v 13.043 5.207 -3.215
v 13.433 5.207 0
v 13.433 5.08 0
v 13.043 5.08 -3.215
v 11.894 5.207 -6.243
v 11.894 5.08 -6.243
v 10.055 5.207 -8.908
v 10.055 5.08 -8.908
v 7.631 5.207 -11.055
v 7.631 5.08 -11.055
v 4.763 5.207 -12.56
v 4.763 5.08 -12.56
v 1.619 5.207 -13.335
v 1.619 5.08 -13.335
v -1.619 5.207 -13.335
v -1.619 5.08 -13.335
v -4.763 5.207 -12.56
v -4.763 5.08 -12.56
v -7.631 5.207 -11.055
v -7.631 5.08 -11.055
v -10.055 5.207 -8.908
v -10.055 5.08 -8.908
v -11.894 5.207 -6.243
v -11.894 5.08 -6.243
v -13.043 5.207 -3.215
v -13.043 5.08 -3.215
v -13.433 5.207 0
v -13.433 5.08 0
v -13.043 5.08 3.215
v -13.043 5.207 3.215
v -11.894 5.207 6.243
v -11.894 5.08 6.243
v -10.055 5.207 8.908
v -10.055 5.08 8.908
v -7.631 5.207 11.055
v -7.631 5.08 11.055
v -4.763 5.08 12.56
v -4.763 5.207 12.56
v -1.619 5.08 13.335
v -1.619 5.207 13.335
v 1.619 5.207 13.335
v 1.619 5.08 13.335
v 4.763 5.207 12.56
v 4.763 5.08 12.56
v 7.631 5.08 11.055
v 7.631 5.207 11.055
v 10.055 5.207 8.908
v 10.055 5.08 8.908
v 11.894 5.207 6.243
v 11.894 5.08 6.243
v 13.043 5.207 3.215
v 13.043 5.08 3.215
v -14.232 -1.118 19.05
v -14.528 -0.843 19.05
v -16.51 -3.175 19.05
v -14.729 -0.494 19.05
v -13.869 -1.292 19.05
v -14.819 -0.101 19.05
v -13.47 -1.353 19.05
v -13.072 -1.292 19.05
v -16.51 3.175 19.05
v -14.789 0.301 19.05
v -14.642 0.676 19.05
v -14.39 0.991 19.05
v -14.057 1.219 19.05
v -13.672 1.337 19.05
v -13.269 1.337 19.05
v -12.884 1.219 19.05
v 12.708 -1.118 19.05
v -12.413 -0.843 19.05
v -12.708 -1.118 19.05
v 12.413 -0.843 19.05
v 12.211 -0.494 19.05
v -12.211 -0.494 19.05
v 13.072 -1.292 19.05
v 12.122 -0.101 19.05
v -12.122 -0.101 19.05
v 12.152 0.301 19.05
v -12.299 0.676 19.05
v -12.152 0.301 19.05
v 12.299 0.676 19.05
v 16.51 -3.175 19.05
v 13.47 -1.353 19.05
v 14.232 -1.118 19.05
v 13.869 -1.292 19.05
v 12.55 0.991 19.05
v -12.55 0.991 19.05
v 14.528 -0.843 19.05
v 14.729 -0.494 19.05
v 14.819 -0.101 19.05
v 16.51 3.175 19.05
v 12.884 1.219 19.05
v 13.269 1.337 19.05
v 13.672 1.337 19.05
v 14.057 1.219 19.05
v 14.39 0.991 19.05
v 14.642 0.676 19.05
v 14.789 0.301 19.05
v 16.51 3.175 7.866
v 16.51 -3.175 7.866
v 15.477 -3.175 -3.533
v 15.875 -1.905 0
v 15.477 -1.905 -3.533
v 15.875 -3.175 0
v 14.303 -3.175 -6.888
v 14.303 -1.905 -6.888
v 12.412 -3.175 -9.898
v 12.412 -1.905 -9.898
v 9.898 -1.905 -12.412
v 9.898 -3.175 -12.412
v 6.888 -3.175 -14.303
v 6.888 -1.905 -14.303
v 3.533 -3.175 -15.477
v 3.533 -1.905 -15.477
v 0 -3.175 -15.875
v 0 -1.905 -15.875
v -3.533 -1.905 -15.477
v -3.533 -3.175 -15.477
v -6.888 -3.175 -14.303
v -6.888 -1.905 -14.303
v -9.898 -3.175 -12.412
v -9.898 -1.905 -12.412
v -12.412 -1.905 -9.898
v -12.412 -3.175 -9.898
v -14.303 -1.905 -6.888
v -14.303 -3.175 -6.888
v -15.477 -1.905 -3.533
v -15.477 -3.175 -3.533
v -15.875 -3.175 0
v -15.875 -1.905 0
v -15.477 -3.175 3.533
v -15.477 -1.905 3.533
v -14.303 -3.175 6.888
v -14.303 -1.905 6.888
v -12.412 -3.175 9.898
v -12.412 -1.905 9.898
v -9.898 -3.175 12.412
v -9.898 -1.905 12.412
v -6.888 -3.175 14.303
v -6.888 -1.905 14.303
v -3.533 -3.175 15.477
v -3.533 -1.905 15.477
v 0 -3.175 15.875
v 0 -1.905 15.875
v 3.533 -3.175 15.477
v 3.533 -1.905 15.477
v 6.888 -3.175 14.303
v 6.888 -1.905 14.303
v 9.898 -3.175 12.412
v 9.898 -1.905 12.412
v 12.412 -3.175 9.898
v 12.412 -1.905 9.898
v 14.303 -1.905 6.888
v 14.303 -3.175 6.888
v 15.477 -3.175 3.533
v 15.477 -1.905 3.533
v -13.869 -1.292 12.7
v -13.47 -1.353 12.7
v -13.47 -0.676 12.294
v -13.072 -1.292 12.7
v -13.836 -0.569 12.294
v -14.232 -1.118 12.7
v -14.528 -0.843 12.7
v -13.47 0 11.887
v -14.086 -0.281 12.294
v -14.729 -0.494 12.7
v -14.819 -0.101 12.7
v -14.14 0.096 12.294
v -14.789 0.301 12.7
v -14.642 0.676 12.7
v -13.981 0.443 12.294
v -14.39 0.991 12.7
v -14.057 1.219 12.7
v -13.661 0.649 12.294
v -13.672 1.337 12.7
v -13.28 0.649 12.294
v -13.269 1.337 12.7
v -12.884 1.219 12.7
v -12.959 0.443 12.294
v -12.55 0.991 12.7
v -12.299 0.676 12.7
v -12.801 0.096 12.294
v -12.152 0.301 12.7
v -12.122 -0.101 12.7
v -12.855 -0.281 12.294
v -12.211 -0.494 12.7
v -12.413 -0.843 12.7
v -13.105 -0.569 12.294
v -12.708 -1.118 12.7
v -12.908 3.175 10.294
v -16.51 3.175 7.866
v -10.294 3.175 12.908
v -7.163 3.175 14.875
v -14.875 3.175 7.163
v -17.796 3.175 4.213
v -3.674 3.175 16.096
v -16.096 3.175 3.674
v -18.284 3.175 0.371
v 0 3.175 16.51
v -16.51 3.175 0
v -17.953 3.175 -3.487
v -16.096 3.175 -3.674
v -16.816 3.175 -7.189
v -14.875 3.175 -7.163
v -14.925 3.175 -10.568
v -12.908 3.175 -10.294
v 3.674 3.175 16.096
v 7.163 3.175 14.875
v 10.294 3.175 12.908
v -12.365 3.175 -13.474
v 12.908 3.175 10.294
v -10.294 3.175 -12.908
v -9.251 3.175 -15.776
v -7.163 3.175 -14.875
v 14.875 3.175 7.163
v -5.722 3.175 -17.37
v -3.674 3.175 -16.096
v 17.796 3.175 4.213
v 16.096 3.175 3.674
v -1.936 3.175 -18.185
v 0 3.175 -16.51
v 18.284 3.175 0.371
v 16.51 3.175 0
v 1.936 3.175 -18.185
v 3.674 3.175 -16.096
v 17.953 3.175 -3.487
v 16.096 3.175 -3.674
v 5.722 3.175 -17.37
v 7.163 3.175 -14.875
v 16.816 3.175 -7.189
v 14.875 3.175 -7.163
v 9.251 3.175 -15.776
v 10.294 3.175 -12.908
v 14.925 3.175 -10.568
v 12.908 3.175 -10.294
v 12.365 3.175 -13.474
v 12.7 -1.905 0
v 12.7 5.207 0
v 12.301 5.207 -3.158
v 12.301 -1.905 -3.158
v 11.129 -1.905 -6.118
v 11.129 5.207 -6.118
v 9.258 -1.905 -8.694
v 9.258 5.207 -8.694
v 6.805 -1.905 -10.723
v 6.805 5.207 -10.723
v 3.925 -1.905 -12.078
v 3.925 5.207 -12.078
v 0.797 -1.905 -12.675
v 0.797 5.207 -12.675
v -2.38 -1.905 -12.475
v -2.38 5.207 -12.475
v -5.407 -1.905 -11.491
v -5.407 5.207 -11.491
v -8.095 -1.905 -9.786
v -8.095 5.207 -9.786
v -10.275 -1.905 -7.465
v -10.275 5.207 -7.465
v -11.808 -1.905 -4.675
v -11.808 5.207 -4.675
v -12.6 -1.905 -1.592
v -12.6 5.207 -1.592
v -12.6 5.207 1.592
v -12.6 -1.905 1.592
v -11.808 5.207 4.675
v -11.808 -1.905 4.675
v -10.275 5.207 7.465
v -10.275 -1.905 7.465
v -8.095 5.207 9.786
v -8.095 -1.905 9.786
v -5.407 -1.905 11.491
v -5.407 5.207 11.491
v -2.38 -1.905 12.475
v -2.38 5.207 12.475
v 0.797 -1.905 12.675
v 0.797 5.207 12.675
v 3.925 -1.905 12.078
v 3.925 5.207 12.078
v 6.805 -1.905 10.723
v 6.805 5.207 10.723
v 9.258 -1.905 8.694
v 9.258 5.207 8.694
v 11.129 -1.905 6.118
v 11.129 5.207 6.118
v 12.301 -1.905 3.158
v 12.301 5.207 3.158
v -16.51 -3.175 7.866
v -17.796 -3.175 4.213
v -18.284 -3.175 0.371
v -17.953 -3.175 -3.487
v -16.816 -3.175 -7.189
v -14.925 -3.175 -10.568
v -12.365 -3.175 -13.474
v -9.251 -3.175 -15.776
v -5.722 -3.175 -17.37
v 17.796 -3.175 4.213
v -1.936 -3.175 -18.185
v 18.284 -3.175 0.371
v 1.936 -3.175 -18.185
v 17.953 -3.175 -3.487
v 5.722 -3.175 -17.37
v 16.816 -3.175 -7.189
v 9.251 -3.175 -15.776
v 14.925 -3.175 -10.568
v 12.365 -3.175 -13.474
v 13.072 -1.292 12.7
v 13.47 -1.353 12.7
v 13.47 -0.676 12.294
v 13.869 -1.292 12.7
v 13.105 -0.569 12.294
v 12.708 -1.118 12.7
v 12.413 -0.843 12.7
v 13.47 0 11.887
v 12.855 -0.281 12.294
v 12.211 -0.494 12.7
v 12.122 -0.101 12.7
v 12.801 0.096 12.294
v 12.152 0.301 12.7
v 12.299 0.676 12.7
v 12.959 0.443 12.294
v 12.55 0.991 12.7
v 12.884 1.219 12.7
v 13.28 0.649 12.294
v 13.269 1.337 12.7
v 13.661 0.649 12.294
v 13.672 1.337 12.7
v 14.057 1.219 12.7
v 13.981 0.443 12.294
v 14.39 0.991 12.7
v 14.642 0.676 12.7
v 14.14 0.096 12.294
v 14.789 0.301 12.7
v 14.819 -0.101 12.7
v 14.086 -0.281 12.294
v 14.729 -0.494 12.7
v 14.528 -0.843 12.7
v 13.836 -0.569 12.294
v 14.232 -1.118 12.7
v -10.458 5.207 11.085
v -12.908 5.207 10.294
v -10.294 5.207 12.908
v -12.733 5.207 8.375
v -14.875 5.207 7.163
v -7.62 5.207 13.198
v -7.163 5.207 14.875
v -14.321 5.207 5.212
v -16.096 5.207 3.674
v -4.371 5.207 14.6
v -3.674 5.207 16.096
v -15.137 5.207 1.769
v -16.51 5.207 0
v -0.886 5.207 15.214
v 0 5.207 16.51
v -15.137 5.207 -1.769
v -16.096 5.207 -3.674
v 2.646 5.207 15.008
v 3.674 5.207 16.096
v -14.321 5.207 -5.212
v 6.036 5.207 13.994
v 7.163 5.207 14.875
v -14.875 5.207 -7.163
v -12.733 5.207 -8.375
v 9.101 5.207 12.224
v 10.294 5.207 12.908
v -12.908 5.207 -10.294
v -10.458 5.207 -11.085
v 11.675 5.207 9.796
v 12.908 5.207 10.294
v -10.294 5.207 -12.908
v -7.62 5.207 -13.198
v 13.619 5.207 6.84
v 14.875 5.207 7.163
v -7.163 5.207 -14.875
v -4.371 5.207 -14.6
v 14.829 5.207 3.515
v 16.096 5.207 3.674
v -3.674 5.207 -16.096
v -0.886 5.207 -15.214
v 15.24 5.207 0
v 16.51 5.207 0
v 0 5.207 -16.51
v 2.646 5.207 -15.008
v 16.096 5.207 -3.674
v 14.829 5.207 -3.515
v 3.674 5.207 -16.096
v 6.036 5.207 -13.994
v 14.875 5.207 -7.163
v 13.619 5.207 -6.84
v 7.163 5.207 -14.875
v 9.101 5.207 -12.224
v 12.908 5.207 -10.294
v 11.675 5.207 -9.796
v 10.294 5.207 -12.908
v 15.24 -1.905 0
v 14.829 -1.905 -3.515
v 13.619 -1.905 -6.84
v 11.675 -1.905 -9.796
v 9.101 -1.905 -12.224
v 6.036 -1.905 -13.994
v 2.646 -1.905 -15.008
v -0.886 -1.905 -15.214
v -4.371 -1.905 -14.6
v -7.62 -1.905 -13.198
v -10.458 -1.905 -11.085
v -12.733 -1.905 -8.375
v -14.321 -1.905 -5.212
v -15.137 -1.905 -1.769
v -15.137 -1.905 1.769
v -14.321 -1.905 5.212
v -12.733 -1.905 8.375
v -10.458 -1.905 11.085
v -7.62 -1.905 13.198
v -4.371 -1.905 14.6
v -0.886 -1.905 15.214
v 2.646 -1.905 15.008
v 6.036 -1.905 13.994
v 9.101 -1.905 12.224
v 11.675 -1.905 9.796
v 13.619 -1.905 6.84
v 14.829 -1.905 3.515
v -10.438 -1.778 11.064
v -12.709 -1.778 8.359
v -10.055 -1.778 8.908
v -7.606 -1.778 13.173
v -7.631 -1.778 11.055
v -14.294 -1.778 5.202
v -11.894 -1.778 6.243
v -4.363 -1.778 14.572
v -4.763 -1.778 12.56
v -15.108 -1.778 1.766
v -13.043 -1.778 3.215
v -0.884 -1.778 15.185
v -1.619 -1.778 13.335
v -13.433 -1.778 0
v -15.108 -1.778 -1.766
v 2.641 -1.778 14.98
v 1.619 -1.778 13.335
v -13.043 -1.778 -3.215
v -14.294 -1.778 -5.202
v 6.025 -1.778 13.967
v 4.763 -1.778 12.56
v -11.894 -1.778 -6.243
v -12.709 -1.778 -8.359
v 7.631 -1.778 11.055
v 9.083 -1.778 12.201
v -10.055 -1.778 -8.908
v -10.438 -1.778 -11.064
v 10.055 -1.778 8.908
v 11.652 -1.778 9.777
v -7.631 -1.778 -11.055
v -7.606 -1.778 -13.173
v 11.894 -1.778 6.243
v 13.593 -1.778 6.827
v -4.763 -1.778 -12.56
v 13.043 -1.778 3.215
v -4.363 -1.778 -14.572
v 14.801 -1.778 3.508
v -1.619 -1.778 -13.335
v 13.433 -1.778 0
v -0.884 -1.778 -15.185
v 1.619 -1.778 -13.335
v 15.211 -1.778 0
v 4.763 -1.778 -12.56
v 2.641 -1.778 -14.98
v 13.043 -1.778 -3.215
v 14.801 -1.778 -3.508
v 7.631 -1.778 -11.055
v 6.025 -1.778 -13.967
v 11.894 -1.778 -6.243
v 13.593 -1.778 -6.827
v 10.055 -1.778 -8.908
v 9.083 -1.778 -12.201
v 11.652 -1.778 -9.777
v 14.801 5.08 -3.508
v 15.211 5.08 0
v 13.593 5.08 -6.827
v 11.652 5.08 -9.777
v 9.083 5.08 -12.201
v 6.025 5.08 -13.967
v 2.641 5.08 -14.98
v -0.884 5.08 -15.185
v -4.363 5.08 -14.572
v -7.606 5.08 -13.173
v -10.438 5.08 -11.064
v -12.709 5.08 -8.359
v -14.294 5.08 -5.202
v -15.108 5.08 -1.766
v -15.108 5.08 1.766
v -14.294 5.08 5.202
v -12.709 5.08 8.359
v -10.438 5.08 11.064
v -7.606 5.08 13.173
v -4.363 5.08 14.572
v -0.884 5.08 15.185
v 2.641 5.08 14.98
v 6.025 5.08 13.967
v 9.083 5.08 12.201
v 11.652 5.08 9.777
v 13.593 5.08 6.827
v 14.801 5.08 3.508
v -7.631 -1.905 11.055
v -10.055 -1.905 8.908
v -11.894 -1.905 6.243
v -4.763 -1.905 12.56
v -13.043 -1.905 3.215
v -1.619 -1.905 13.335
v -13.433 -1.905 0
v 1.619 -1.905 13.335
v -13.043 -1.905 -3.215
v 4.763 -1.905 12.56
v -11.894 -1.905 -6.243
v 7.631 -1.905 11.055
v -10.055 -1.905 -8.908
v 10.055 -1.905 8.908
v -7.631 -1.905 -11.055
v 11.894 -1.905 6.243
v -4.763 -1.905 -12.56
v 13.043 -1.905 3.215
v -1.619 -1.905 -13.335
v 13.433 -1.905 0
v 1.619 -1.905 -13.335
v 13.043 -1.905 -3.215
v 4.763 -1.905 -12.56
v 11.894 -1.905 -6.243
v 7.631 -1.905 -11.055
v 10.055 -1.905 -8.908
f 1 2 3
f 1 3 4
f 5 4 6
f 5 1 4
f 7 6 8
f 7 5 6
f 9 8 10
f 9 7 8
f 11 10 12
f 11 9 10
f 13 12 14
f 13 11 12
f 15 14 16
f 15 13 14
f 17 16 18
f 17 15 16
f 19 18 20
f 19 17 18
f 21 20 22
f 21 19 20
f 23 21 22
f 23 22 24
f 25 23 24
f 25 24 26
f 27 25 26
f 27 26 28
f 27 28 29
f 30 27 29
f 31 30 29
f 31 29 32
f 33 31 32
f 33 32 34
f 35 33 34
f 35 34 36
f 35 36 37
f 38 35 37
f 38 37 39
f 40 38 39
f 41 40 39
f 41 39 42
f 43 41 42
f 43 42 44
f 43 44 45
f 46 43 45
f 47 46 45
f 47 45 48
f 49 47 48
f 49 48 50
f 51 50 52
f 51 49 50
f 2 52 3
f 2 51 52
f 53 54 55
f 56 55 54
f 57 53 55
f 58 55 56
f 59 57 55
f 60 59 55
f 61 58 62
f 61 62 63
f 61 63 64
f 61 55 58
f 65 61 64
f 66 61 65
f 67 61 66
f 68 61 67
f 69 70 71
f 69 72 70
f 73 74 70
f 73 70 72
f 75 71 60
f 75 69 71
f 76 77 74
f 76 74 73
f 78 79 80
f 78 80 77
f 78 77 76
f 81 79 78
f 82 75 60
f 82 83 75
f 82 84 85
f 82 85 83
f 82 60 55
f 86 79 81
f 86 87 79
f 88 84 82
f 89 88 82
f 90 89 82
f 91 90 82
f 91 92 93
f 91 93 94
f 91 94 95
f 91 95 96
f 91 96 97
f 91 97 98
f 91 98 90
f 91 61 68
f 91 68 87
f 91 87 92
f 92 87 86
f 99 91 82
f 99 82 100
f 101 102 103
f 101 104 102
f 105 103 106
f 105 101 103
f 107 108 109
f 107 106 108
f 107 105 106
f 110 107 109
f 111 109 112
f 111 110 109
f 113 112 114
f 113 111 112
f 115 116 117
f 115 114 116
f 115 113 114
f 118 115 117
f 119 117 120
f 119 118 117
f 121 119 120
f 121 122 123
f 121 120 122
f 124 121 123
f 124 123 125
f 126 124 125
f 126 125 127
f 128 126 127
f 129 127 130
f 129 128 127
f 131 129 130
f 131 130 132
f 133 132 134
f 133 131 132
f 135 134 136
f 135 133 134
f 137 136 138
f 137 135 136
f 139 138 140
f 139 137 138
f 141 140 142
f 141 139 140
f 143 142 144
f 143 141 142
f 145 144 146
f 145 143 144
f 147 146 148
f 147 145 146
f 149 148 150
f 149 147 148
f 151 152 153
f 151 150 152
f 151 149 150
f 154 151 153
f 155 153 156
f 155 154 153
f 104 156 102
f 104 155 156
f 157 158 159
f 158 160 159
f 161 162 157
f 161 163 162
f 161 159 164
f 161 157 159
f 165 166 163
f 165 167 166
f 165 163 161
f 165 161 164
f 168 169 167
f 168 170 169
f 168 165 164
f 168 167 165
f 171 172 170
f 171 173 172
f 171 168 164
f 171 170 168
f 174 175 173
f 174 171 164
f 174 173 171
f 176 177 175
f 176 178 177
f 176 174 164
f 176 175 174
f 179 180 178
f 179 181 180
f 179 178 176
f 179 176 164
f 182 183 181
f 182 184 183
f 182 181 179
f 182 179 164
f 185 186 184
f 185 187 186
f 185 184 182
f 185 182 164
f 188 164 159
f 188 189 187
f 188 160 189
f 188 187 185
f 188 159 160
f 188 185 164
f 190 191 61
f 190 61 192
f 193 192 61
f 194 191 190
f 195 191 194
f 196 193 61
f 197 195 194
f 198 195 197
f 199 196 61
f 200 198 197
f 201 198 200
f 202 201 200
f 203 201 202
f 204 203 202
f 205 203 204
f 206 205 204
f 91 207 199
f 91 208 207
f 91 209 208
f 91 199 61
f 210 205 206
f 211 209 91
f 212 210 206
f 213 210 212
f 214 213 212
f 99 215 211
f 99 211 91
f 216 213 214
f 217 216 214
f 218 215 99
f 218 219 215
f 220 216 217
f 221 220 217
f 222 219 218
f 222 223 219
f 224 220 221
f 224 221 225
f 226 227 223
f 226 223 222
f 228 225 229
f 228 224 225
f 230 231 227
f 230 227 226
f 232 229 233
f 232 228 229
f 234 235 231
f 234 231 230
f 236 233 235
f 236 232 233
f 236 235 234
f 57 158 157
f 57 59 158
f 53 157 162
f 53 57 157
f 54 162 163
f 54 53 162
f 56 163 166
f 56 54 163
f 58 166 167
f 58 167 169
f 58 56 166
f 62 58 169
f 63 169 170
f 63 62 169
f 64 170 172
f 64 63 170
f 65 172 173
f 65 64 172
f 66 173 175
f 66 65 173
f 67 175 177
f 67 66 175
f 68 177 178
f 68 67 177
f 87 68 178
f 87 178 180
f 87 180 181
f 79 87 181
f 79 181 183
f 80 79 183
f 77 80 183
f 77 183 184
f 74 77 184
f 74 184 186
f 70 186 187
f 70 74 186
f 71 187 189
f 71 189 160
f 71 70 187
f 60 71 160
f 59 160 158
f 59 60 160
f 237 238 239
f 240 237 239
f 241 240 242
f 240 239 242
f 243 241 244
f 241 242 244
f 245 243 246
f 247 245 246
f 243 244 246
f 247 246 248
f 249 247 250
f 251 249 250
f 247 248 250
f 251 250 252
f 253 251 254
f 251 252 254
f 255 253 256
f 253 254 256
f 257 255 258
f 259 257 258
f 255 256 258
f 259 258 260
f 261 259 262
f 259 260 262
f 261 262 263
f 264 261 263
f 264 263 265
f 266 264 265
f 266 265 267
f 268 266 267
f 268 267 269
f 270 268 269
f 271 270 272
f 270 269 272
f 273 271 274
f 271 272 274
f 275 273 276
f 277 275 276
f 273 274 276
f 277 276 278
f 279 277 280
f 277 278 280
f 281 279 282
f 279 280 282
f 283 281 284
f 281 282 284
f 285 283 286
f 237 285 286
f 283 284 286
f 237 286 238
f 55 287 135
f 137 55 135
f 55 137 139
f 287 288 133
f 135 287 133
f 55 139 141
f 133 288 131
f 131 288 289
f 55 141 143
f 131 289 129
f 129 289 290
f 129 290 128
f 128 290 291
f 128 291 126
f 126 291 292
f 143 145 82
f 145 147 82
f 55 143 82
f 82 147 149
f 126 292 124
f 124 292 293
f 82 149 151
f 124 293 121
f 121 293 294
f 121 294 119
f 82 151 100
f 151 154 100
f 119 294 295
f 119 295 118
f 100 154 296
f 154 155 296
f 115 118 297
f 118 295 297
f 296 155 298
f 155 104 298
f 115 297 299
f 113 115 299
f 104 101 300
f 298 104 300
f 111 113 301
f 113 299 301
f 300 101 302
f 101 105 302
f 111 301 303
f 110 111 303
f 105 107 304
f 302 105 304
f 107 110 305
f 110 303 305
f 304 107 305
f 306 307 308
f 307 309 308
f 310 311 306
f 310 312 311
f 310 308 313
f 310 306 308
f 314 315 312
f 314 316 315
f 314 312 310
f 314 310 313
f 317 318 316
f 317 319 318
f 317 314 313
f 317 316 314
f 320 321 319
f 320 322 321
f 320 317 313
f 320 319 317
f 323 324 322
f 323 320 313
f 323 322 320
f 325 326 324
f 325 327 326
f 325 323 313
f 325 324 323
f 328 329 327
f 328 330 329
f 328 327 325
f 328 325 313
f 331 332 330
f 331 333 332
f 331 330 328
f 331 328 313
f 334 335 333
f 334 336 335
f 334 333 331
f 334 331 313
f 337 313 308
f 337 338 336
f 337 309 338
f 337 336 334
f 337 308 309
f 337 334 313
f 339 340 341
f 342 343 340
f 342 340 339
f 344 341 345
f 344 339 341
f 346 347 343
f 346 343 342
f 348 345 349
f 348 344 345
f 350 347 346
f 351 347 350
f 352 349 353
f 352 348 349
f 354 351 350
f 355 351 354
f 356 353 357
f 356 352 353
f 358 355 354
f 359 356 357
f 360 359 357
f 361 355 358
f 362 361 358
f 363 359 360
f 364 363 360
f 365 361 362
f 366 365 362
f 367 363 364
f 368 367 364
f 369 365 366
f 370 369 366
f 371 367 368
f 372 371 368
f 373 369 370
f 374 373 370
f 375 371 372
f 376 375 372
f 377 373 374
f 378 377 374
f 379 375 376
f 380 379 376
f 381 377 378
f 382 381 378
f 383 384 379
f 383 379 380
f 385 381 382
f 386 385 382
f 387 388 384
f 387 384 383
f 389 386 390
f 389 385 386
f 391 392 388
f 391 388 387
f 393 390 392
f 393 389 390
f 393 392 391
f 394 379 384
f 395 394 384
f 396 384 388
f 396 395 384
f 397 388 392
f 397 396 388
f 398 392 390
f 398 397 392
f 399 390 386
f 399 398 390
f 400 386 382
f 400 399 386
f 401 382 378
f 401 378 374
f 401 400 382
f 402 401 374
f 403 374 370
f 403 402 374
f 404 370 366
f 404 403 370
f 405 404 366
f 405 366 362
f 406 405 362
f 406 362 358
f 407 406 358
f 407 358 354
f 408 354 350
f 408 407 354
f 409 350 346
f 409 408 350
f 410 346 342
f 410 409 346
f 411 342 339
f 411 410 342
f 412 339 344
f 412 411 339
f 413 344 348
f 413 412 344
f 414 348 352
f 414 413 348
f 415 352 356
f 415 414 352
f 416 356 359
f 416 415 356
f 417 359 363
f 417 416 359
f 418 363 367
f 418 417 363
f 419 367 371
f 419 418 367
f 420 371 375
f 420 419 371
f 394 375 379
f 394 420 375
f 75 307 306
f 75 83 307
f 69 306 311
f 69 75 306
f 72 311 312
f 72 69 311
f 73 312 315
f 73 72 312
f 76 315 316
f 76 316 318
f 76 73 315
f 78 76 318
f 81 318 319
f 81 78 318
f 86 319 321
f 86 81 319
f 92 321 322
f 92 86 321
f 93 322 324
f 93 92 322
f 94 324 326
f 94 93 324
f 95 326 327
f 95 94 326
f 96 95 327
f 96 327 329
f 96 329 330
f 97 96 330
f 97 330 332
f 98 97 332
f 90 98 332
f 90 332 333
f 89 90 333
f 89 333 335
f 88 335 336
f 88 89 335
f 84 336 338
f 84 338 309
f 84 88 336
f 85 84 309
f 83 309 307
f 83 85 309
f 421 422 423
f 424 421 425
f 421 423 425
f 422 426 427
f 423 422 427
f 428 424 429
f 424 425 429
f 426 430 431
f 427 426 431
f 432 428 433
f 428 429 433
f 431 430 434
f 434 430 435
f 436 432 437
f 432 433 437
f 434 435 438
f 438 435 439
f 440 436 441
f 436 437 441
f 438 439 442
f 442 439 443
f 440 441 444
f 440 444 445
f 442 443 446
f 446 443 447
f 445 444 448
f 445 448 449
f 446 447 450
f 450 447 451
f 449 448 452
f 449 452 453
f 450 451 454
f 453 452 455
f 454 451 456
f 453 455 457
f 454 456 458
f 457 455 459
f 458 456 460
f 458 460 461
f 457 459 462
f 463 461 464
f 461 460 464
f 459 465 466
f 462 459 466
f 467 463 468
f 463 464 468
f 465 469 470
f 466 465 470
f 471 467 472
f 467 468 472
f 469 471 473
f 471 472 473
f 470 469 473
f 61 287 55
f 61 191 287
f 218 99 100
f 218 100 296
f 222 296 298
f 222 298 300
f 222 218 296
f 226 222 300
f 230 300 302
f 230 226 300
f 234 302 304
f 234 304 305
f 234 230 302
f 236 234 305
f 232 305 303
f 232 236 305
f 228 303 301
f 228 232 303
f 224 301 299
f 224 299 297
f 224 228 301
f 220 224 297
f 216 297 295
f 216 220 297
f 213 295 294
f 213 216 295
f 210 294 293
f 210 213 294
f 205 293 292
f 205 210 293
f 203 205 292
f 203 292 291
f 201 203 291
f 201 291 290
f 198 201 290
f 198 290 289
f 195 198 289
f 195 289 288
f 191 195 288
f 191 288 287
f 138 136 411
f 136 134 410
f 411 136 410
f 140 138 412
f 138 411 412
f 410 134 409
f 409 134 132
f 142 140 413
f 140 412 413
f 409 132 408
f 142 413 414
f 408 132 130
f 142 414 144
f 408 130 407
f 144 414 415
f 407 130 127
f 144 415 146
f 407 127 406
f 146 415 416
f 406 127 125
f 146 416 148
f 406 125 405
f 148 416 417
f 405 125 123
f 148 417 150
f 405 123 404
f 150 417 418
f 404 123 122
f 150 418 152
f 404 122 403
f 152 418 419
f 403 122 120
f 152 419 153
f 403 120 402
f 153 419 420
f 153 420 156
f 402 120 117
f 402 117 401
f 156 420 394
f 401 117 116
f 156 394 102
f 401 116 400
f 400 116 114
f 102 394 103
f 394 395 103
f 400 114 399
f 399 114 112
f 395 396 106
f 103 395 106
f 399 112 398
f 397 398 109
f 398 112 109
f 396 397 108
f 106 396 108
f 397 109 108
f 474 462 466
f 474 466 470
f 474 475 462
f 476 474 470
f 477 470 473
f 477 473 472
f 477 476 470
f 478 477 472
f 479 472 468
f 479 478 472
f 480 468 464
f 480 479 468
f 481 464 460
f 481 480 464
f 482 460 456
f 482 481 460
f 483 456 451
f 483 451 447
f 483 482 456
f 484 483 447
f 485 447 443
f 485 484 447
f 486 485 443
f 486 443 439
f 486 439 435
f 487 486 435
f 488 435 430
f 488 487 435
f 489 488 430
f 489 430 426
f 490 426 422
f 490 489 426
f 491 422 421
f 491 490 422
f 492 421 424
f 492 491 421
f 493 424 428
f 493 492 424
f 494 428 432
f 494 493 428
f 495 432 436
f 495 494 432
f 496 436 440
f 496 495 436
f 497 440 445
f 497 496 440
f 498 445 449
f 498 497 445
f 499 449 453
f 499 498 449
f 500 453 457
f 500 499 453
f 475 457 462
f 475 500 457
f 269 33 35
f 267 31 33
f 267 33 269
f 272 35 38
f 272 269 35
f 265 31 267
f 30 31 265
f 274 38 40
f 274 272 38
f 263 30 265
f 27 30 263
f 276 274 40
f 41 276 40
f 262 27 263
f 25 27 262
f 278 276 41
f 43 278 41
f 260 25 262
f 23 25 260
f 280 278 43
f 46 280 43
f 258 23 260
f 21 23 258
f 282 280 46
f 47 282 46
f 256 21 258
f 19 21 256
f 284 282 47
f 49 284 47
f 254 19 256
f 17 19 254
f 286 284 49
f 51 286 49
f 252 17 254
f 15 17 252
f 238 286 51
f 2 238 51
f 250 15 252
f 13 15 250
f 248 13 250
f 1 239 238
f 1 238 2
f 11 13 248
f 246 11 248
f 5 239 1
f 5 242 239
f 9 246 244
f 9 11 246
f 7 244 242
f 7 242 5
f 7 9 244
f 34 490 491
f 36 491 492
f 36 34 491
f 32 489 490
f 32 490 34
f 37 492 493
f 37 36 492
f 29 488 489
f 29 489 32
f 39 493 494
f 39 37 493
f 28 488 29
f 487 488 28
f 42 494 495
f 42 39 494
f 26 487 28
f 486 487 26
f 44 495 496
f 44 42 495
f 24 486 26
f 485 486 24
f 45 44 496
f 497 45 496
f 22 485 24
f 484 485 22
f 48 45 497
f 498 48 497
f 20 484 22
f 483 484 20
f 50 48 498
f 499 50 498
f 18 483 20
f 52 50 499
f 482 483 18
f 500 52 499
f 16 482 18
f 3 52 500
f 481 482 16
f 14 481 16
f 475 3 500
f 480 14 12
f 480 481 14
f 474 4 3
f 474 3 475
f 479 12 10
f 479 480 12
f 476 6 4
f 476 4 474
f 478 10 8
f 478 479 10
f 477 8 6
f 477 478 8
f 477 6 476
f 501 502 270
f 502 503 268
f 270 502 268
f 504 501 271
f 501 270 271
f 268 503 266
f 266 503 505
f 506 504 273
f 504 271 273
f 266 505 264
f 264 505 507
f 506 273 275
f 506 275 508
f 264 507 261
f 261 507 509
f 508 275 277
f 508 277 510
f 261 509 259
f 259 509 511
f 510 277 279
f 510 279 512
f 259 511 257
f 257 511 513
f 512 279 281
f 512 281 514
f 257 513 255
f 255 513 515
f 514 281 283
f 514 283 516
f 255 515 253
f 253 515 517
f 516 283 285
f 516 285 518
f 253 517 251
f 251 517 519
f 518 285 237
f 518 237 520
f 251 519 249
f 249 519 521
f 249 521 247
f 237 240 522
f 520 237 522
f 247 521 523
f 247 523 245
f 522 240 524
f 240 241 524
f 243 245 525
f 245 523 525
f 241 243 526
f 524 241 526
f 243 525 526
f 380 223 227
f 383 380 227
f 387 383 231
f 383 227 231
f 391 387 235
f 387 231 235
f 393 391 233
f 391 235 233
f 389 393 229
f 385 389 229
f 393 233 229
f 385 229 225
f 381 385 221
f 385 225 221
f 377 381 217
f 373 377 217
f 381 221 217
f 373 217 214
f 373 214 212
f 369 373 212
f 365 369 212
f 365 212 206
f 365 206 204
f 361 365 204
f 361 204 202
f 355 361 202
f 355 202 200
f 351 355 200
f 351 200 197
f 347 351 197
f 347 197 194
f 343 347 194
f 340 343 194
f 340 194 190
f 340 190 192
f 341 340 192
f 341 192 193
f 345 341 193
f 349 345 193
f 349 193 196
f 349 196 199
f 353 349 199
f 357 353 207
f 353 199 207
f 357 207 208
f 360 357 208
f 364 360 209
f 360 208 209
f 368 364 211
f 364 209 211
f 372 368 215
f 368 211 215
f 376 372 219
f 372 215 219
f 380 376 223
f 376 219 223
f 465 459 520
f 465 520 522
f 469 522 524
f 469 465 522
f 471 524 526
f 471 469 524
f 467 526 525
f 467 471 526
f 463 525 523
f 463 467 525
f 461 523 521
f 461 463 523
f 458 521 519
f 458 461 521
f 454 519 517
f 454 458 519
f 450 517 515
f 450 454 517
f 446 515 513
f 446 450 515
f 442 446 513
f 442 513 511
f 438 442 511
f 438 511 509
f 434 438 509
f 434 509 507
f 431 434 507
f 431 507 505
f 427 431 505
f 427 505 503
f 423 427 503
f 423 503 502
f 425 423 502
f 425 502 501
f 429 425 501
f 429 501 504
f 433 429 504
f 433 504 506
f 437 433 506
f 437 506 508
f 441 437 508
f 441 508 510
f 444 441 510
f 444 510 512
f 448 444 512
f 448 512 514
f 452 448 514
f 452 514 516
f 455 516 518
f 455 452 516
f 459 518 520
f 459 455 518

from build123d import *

# Parameters (mm, degrees)
SKETCH1_R                      = 15.875
BOSS_EXTRUDE1_DEPTH            = 3.175
SKETCH2_R                      = 16.51
CUT_EXTRUDE1_DEPTH             = 5.08
SKETCH3_R                      = 16.51
SKETCH3_R_2                    = 15.24
BOSS_EXTRUDE2_DEPTH            = 7.112
SKETCH4_R                      = 15.211059678
SKETCH4_R_2                    = 13.433059678
BOSS_EXTRUDE3_DEPTH            = 5.08
BOSS_EXTRUDE3_DEPTH_BACK       = 1.778
SKETCH5_R                      = 13.433059678
SKETCH5_R_2                    = 12.7
BOSS_EXTRUDE4_DEPTH            = 7.112
F_6_32_TAPPED_HOLE1_AT_2_COUNT = 2
F_6_32_TAPPED_HOLE1_AT_2_PITCH = 26.940768363


with BuildPart() as part:
    # Sketch1 → Boss-Extrude1 (new body, symmetric)
    with BuildSketch(Plane(origin=(0, 0, 0), x_dir=(1, 0, 0), z_dir=(0, 1, 0))):
        with BuildLine():
            Line((-16.51, -19.05), (16.51, -19.05))
            Line((16.51, -19.05), (16.51, -7.865802184))
            ThreePointArc((16.51, -7.865802184), (0, 18.288), (-16.51, -7.865802184))
            Line((-16.51, -7.865802184), (-16.51, -19.05))
        make_face()
        Circle(SKETCH1_R, mode=Mode.SUBTRACT)
    extrude(amount=BOSS_EXTRUDE1_DEPTH, both=True)

    # Sketch2 → Cut-Extrude1 (cut)
    with BuildSketch(Plane(origin=(0, 3.175, 0), x_dir=(1, 0, 0), z_dir=(0, 1, 0))):
        Circle(SKETCH2_R)
    extrude(amount=-CUT_EXTRUDE1_DEPTH, mode=Mode.SUBTRACT)

    # Sketch3 → Boss-Extrude2 (add)
    with BuildSketch(Plane(origin=(0, -1.905, 0), x_dir=(1, 0, 0), z_dir=(0, 1, 0))):
        Circle(SKETCH3_R)
        Circle(SKETCH3_R_2, mode=Mode.SUBTRACT)
    extrude(amount=BOSS_EXTRUDE2_DEPTH)

    # Sketch7 → #6-32 Tapped Hole1 (revolve, cut)
    with BuildSketch(Plane(origin=(13.470384182, 0, 19.05), x_dir=(0, -1, 0), z_dir=(1, 0, 0))):
        Polygon((0, 0), (0, 7.16269403), (1.35255, 6.35), (1.35255, 0), align=None)
    f_6_32_tapped_hole1 = revolve(axis=Axis((13.470384182, 0, 25.4), (0, 0, -1)), mode=Mode.SUBTRACT)

    # #6-32 Tapped Hole1 at 2: #6-32 Tapped Hole1 ×2
    with Locations(*[(-i * F_6_32_TAPPED_HOLE1_AT_2_PITCH, 0, 0) for i in range(1, F_6_32_TAPPED_HOLE1_AT_2_COUNT)]):
        add(f_6_32_tapped_hole1, mode=Mode.SUBTRACT)


with BuildPart() as body_2:
    # Sketch4 → Boss-Extrude3 (new body, two sides)
    with BuildSketch(Plane(origin=(0, 0, 0), x_dir=(1, 0, 0), z_dir=(0, 1, 0))) as boss_extrude3_sk:
        Circle(SKETCH4_R)
        Circle(SKETCH4_R_2, mode=Mode.SUBTRACT)
    extrude(amount=BOSS_EXTRUDE3_DEPTH)
    extrude(boss_extrude3_sk.sketch, amount=-BOSS_EXTRUDE3_DEPTH_BACK)

    # Sketch5 → Boss-Extrude4 (add)
    with BuildSketch(Plane(origin=(0, 5.207, 0), x_dir=(1, 0, 0), z_dir=(0, 1, 0))):
        Circle(SKETCH5_R)
        Circle(SKETCH5_R_2, mode=Mode.SUBTRACT)
    extrude(amount=-BOSS_EXTRUDE4_DEPTH)


solid = Compound([part.part, body_2.part])
